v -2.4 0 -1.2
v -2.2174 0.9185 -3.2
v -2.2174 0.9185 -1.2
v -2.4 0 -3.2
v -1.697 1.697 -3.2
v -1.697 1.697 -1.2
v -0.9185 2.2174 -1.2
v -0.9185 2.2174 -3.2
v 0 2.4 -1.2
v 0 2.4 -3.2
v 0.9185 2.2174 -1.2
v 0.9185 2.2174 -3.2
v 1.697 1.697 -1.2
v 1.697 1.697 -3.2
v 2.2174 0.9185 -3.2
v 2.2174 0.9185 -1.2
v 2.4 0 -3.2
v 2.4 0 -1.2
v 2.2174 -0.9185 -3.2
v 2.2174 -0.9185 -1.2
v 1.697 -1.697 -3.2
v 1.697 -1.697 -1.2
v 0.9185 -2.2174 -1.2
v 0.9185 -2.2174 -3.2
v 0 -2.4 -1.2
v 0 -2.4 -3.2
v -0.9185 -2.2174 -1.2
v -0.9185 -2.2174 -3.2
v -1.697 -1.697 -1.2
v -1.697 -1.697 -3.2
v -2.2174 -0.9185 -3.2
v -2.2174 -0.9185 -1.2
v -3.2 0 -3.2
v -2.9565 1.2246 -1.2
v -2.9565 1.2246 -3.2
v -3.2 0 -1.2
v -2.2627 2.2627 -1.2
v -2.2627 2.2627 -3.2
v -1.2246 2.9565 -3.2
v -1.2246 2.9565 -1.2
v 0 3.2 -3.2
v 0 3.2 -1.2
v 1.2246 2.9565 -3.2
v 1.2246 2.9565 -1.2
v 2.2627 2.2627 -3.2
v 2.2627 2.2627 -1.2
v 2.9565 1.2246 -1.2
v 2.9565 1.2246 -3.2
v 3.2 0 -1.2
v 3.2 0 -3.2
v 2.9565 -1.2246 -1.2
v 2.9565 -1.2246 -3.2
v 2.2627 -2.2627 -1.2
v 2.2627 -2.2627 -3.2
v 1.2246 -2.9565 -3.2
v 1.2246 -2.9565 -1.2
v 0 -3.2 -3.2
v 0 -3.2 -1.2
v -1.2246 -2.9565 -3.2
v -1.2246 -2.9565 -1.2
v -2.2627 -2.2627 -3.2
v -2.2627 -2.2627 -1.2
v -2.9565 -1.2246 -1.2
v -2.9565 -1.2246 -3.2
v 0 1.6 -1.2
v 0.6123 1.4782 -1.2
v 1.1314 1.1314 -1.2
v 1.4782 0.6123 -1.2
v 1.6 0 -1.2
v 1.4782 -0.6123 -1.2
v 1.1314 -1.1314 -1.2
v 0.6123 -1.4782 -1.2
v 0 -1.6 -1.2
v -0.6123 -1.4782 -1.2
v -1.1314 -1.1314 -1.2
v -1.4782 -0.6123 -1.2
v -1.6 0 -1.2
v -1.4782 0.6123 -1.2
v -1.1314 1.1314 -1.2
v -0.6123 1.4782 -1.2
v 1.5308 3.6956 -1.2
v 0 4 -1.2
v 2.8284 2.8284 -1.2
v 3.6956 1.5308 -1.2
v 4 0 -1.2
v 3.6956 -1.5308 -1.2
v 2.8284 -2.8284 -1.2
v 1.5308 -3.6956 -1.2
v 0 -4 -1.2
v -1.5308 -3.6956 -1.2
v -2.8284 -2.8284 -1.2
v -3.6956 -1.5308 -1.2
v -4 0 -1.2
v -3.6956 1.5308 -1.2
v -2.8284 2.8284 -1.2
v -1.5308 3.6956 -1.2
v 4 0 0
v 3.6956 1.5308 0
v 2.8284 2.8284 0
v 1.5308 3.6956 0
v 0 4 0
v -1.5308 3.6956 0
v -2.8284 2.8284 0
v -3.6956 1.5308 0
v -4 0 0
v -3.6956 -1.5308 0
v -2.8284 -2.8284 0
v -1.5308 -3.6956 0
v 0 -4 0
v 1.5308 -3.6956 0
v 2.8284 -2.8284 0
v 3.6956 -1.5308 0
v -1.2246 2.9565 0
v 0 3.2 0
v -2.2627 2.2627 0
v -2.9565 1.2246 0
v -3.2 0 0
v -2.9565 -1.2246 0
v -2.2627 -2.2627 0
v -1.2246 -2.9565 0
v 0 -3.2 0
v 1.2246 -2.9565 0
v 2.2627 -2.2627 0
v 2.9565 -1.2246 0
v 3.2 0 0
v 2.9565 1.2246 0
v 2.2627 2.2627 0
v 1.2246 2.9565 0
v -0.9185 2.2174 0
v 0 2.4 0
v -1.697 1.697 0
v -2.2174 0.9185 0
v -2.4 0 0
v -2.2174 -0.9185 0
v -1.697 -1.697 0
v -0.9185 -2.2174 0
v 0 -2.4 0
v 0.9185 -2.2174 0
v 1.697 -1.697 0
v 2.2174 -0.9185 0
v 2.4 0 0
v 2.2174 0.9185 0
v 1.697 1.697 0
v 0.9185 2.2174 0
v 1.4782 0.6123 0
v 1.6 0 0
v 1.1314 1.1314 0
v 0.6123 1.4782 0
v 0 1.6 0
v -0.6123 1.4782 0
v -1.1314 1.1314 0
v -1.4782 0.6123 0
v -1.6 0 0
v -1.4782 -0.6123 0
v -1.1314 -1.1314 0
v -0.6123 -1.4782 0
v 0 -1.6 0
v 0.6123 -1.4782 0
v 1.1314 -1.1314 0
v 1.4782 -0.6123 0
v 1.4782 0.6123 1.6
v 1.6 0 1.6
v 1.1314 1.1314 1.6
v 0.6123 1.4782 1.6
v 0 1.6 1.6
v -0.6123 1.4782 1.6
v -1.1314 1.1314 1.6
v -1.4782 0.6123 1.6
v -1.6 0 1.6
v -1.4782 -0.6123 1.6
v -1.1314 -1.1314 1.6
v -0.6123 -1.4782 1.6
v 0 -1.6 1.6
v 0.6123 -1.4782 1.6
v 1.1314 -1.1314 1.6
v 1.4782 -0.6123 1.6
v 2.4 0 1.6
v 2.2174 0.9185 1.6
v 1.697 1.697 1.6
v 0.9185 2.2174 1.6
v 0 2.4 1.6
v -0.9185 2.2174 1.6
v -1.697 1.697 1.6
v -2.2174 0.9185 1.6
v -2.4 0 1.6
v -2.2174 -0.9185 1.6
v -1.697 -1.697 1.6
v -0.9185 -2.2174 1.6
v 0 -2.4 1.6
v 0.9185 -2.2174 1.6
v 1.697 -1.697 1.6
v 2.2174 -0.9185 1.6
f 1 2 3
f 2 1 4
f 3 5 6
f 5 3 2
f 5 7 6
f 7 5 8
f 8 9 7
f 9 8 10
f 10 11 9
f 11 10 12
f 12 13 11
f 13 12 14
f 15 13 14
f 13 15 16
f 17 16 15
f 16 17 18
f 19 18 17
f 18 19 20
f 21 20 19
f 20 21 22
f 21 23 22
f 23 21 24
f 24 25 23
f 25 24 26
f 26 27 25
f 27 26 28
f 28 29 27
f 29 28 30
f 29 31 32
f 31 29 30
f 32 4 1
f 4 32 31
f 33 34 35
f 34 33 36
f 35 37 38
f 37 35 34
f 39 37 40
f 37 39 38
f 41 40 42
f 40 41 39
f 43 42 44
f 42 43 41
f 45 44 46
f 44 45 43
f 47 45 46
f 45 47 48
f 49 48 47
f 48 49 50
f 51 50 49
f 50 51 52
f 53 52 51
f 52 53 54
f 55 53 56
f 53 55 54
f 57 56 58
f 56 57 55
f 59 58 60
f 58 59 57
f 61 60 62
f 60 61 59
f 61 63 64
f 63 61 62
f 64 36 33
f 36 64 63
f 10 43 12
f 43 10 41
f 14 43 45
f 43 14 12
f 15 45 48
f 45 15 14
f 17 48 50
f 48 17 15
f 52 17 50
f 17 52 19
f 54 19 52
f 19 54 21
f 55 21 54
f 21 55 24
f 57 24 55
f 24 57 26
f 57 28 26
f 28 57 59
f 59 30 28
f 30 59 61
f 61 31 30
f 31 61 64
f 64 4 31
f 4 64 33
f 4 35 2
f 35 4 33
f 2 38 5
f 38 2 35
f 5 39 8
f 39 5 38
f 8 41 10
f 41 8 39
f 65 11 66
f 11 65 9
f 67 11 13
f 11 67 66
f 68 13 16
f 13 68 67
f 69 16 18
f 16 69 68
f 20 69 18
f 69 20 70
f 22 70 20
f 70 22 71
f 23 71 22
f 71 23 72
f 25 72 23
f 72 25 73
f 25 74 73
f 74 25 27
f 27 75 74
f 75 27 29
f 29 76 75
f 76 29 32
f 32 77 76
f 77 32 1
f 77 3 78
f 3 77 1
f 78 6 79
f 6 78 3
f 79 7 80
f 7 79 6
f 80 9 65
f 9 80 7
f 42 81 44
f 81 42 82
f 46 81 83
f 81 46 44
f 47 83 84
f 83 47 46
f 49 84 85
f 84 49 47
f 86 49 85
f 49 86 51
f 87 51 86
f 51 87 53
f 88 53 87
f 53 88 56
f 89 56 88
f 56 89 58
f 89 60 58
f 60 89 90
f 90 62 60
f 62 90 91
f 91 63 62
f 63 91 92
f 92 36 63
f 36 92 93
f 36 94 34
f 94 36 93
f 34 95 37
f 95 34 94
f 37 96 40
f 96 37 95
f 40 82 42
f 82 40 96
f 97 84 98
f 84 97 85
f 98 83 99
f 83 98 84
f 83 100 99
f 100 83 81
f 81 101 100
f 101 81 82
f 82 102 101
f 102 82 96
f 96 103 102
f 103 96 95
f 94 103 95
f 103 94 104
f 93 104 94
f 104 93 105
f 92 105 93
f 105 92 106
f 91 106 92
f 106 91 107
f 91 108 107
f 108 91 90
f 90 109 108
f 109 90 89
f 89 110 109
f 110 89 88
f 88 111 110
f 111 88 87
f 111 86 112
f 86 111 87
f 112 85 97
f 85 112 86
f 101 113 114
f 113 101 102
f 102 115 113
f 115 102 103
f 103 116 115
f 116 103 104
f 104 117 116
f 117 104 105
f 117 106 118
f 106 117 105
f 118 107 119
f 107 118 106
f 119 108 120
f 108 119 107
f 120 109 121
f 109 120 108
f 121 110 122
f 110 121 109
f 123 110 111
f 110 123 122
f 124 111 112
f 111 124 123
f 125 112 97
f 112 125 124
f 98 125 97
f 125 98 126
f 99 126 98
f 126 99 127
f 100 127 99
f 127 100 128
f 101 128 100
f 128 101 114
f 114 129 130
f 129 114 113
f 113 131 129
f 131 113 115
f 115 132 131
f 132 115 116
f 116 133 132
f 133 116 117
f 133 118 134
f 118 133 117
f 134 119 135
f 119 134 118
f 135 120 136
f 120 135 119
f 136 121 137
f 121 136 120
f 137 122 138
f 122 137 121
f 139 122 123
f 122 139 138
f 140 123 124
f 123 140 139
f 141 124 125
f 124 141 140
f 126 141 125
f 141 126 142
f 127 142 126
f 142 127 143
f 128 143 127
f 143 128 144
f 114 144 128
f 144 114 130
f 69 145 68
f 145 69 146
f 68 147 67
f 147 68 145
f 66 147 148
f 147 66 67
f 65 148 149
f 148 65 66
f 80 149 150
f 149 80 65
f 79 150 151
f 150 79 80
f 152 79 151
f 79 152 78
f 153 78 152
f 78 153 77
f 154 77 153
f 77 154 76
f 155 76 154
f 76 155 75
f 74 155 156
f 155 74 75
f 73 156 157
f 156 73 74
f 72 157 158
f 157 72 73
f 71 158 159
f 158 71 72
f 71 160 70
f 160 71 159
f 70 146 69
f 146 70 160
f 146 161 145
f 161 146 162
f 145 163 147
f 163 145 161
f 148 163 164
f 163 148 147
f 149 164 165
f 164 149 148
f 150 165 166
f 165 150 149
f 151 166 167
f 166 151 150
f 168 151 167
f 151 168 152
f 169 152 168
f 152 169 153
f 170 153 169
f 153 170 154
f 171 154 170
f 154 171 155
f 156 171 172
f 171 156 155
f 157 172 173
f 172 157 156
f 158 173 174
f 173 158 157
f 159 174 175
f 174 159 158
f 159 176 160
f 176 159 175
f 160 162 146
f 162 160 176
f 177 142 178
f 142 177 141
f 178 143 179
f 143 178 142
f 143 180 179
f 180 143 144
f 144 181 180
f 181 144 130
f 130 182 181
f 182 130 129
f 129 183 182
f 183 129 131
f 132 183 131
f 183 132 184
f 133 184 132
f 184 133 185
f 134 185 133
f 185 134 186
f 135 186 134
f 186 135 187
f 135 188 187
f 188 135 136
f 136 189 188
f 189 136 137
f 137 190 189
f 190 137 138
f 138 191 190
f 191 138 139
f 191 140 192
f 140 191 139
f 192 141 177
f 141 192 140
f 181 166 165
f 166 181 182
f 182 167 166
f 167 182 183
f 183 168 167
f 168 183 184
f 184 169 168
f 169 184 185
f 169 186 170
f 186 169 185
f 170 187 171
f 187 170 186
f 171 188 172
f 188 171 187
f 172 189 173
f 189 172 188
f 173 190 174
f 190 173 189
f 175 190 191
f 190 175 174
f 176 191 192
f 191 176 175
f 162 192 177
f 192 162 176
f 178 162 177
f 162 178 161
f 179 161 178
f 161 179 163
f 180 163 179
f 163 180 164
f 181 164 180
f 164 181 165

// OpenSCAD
// file: ../p/stud4.scad
use <../lib.scad>
use <4-4cyli.scad>
use <4-4edge.scad>
use <4-4ring3.scad>
function ldraw_lib__stud4() = [
// 0 Stud Tube Open
// 0 Name: stud4.dat
// 0 Author: James Jessiman
// 0 !LDRAW_ORG Primitive UPDATE 2009-02
// 0 !LICENSE Licensed under CC BY 2.0 and CC BY 4.0 : see CAreadme.txt
// 
// 0 BFC CERTIFY CCW
  [0,"BFC","CERTIFY"],
  [0,"BFC","CCW"],
// 
// 0 !HISTORY 1999-07-05 [PTadmin] Official Update 1999-05
// 0 !HISTORY 2002-04-04 [sbliss] Modified for BFC compliance
// 0 !HISTORY 2002-04-25 [PTadmin] Official Update 2002-02
// 0 !HISTORY 2007-06-24 [PTadmin] Header formatted for Contributor Agreement
// 0 !HISTORY 2008-07-01 [PTadmin] Official Update 2008-01
// 0 !HISTORY 2009-06-21 [cwdee] Update ring references to 4-4ring
// 0 !HISTORY 2009-09-03 [PTadmin] Official Update 2009-02
// 
// 
// 1 16 0 -4 0 6 0 0 0 1 0 0 0 6 4-4edge.dat
  [1,16,0,-4,0,6,0,0,0,1,0,0,0,6, ldraw_lib__4_4edge()],
// 1 16 0 -4 0 8 0 0 0 1 0 0 0 8 4-4edge.dat
  [1,16,0,-4,0,8,0,0,0,1,0,0,0,8, ldraw_lib__4_4edge()],
// 1 16 0 0 0 6 0 0 0 1 0 0 0 6 4-4edge.dat
  [1,16,0,0,0,6,0,0,0,1,0,0,0,6, ldraw_lib__4_4edge()],
// 1 16 0 0 0 8 0 0 0 1 0 0 0 8 4-4edge.dat
  [1,16,0,0,0,8,0,0,0,1,0,0,0,8, ldraw_lib__4_4edge()],
// 0 BFC INVERTNEXT
  [0,"BFC","INVERTNEXT"],
// 1 16 0 -4 0 6 0 0 0 4 0 0 0 6 4-4cyli.dat
  [1,16,0,-4,0,6,0,0,0,4,0,0,0,6, ldraw_lib__4_4cyli()],
// 1 16 0 -4 0 8 0 0 0 4 0 0 0 8 4-4cyli.dat
  [1,16,0,-4,0,8,0,0,0,4,0,0,0,8, ldraw_lib__4_4cyli()],
// 1 16 0 -4 0 2 0 0 0 1 0 0 0 2 4-4ring3.dat
  [1,16,0,-4,0,2,0,0,0,1,0,0,0,2, ldraw_lib__4_4ring3()],
// 0
];
makepoly(ldraw_lib__stud4(), line=0.2);
// file: ../p/stud2a.scad
use <../lib.scad>
use <4-4cyli.scad>
use <4-4edge.scad>
use <4-4ring2.scad>
function ldraw_lib__stud2a() = [
// 0 Stud Open without Base Edges
// 0 Name: stud2a.dat
// 0 Author: James Jessiman
// 0 !LDRAW_ORG Primitive UPDATE 2009-02
// 0 !LICENSE Licensed under CC BY 2.0 and CC BY 4.0 : see CAreadme.txt
// 
// 0 BFC CERTIFY CCW
  [0,"BFC","CERTIFY"],
  [0,"BFC","CCW"],
// 
// 0 !HISTORY 1999-07-05 [PTadmin] Official Update 1999-05
// 0 !HISTORY 2002-04-04 [sbliss] Modified for BFC compliance
// 0 !HISTORY 2002-04-25 [PTadmin] Official Update 2002-02
// 0 !HISTORY 2007-06-24 [PTadmin] Header formatted for Contributor Agreement
// 0 !HISTORY 2008-07-01 [PTadmin] Official Update 2008-01
// 0 !HISTORY 2009-06-21 [cwdee] Update ring references to 4-4ring
// 0 !HISTORY 2009-09-03 [PTadmin] Official Update 2009-02
// 
// 
// 1 16 0 -4 0 4 0 0 0 1 0 0 0 4 4-4edge.dat
  [1,16,0,-4,0,4,0,0,0,1,0,0,0,4, ldraw_lib__4_4edge()],
// 1 16 0 -4 0 6 0 0 0 1 0 0 0 6 4-4edge.dat
  [1,16,0,-4,0,6,0,0,0,1,0,0,0,6, ldraw_lib__4_4edge()],
// 0 BFC INVERTNEXT
  [0,"BFC","INVERTNEXT"],
// 1 16 0 -4 0 4 0 0 0 4 0 0 0 4 4-4cyli.dat
  [1,16,0,-4,0,4,0,0,0,4,0,0,0,4, ldraw_lib__4_4cyli()],
// 1 16 0 -4 0 6 0 0 0 4 0 0 0 6 4-4cyli.dat
  [1,16,0,-4,0,6,0,0,0,4,0,0,0,6, ldraw_lib__4_4cyli()],
// 1 16 0 -4 0 2 0 0 0 1 0 0 0 2 4-4ring2.dat
  [1,16,0,-4,0,2,0,0,0,1,0,0,0,2, ldraw_lib__4_4ring2()],
// 0
];
makepoly(ldraw_lib__stud2a(), line=0.2);
// file: ../p/4-4ring4.scad
use <../lib.scad>
function ldraw_lib__4_4ring4() = [
// 0 Ring  4 x 1.0
// 0 Name: 4-4ring4.dat
// 0 Author: James Jessiman
// 0 !LDRAW_ORG Primitive UPDATE 2009-01
// 0 !LICENSE Licensed under CC BY 2.0 and CC BY 4.0 : see CAreadme.txt
// 
// 0 BFC CERTIFY CCW
  [0,"BFC","CERTIFY"],
  [0,"BFC","CCW"],
// 
// 0 !HISTORY 1998-12-15 [PTadmin] Official Update 1998-10
// 0 !HISTORY 2002-04-08 [BrickCaster] Modified for BFC compliance
// 0 !HISTORY 2002-04-25 [PTadmin] Official Update 2002-02
// 0 !HISTORY 2007-06-24 [PTadmin] Header formatted for Contributor Agreement
// 0 !HISTORY 2008-07-01 [PTadmin] Official Update 2008-01
// 0 !HISTORY 2008-08-26 [cwdee] Switch polygon winding and rename
// 0 !HISTORY 2009-05-02 [PTadmin] Official Update 2009-01
// 
// 
// 4 16 -1.9135 0 4.6195 -1.5308 0 3.6956 0 0 4 0 0 5
  [4,16,-1.9135,0,4.6195,-1.5308,0,3.6956,0,0,4,0,0,5],
// 4 16 -3.5355 0 3.5355 -2.8284 0 2.8284 -1.5308 0 3.6956 -1.9135 0 4.6195
  [4,16,-3.5355,0,3.5355,-2.8284,0,2.8284,-1.5308,0,3.6956,-1.9135,0,4.6195],
// 4 16 -4.6195 0 1.9135 -3.6956 0 1.5308 -2.8284 0 2.8284 -3.5355 0 3.5355
  [4,16,-4.6195,0,1.9135,-3.6956,0,1.5308,-2.8284,0,2.8284,-3.5355,0,3.5355],
// 4 16 -5 0 0 -4 0 0 -3.6956 0 1.5308 -4.6195 0 1.9135
  [4,16,-5,0,0,-4,0,0,-3.6956,0,1.5308,-4.6195,0,1.9135],
// 4 16 -4.6195 0 -1.9135 -3.6956 0 -1.5308 -4 0 0 -5 0 0
  [4,16,-4.6195,0,-1.9135,-3.6956,0,-1.5308,-4,0,0,-5,0,0],
// 4 16 -3.5355 0 -3.5355 -2.8284 0 -2.8284 -3.6956 0 -1.5308 -4.6195 0 -1.9135
  [4,16,-3.5355,0,-3.5355,-2.8284,0,-2.8284,-3.6956,0,-1.5308,-4.6195,0,-1.9135],
// 4 16 -1.9135 0 -4.6195 -1.5308 0 -3.6956 -2.8284 0 -2.8284 -3.5355 0 -3.5355
  [4,16,-1.9135,0,-4.6195,-1.5308,0,-3.6956,-2.8284,0,-2.8284,-3.5355,0,-3.5355],
// 4 16 0 0 -5 0 0 -4 -1.5308 0 -3.6956 -1.9135 0 -4.6195
  [4,16,0,0,-5,0,0,-4,-1.5308,0,-3.6956,-1.9135,0,-4.6195],
// 4 16 1.9135 0 -4.6195 1.5308 0 -3.6956 0 0 -4 0 0 -5
  [4,16,1.9135,0,-4.6195,1.5308,0,-3.6956,0,0,-4,0,0,-5],
// 4 16 3.5355 0 -3.5355 2.8284 0 -2.8284 1.5308 0 -3.6956 1.9135 0 -4.6195
  [4,16,3.5355,0,-3.5355,2.8284,0,-2.8284,1.5308,0,-3.6956,1.9135,0,-4.6195],
// 4 16 4.6195 0 -1.9135 3.6956 0 -1.5308 2.8284 0 -2.8284 3.5355 0 -3.5355
  [4,16,4.6195,0,-1.9135,3.6956,0,-1.5308,2.8284,0,-2.8284,3.5355,0,-3.5355],
// 4 16 5 0 0 4 0 0 3.6956 0 -1.5308 4.6195 0 -1.9135
  [4,16,5,0,0,4,0,0,3.6956,0,-1.5308,4.6195,0,-1.9135],
// 4 16 4.6195 0 1.9135 3.6956 0 1.5308 4 0 0 5 0 0
  [4,16,4.6195,0,1.9135,3.6956,0,1.5308,4,0,0,5,0,0],
// 4 16 3.5355 0 3.5355 2.8284 0 2.8284 3.6956 0 1.5308 4.6195 0 1.9135
  [4,16,3.5355,0,3.5355,2.8284,0,2.8284,3.6956,0,1.5308,4.6195,0,1.9135],
// 4 16 1.9135 0 4.6195 1.5308 0 3.6956 2.8284 0 2.8284 3.5355 0 3.5355
  [4,16,1.9135,0,4.6195,1.5308,0,3.6956,2.8284,0,2.8284,3.5355,0,3.5355],
// 4 16 0 0 5 0 0 4 1.5308 0 3.6956 1.9135 0 4.6195
  [4,16,0,0,5,0,0,4,1.5308,0,3.6956,1.9135,0,4.6195],
// 0
];
makepoly(ldraw_lib__4_4ring4(), line=0.2);
// file: ../p/4-4ring3.scad
use <../lib.scad>
function ldraw_lib__4_4ring3() = [
// 0 Ring  3 x 1.0
// 0 Name: 4-4ring3.dat
// 0 Author: James Jessiman
// 0 !LDRAW_ORG Primitive UPDATE 2009-01
// 0 !LICENSE Licensed under CC BY 2.0 and CC BY 4.0 : see CAreadme.txt
// 
// 0 BFC CERTIFY CCW
  [0,"BFC","CERTIFY"],
  [0,"BFC","CCW"],
// 
// 0 !HISTORY 1998-12-15 [PTadmin] Official Update 1998-10
// 0 !HISTORY 2002-04-05 [hafhead] Added BFC statement
// 0 !HISTORY 2002-04-25 [PTadmin] Official Update 2002-02
// 0 !HISTORY 2007-06-24 [PTadmin] Header formatted for Contributor Agreement
// 0 !HISTORY 2008-07-01 [PTadmin] Official Update 2008-01
// 0 !HISTORY 2008-08-26 [cwdee] Switch polygon winding and rename
// 0 !HISTORY 2009-05-02 [PTadmin] Official Update 2009-01
// 
// 
// 4 16 -1.5308 0 3.6956 -1.1481 0 2.7717 0 0 3 0 0 4
  [4,16,-1.5308,0,3.6956,-1.1481,0,2.7717,0,0,3,0,0,4],
// 4 16 -2.8284 0 2.8284 -2.1213 0 2.1213 -1.1481 0 2.7717 -1.5308 0 3.6956
  [4,16,-2.8284,0,2.8284,-2.1213,0,2.1213,-1.1481,0,2.7717,-1.5308,0,3.6956],
// 4 16 -3.6956 0 1.5308 -2.7717 0 1.1481 -2.1213 0 2.1213 -2.8284 0 2.8284
  [4,16,-3.6956,0,1.5308,-2.7717,0,1.1481,-2.1213,0,2.1213,-2.8284,0,2.8284],
// 4 16 -4 0 0 -3 0 0 -2.7717 0 1.1481 -3.6956 0 1.5308
  [4,16,-4,0,0,-3,0,0,-2.7717,0,1.1481,-3.6956,0,1.5308],
// 4 16 -3.6956 0 -1.5308 -2.7717 0 -1.1481 -3 0 0 -4 0 0
  [4,16,-3.6956,0,-1.5308,-2.7717,0,-1.1481,-3,0,0,-4,0,0],
// 4 16 -2.8284 0 -2.8284 -2.1213 0 -2.1213 -2.7717 0 -1.1481 -3.6956 0 -1.5308
  [4,16,-2.8284,0,-2.8284,-2.1213,0,-2.1213,-2.7717,0,-1.1481,-3.6956,0,-1.5308],
// 4 16 -1.5308 0 -3.6956 -1.1481 0 -2.7717 -2.1213 0 -2.1213 -2.8284 0 -2.8284
  [4,16,-1.5308,0,-3.6956,-1.1481,0,-2.7717,-2.1213,0,-2.1213,-2.8284,0,-2.8284],
// 4 16 0 0 -4 0 0 -3 -1.1481 0 -2.7717 -1.5308 0 -3.6956
  [4,16,0,0,-4,0,0,-3,-1.1481,0,-2.7717,-1.5308,0,-3.6956],
// 4 16 1.5308 0 -3.6956 1.1481 0 -2.7717 0 0 -3 0 0 -4
  [4,16,1.5308,0,-3.6956,1.1481,0,-2.7717,0,0,-3,0,0,-4],
// 4 16 2.8284 0 -2.8284 2.1213 0 -2.1213 1.1481 0 -2.7717 1.5308 0 -3.6956
  [4,16,2.8284,0,-2.8284,2.1213,0,-2.1213,1.1481,0,-2.7717,1.5308,0,-3.6956],
// 4 16 3.6956 0 -1.5308 2.7717 0 -1.1481 2.1213 0 -2.1213 2.8284 0 -2.8284
  [4,16,3.6956,0,-1.5308,2.7717,0,-1.1481,2.1213,0,-2.1213,2.8284,0,-2.8284],
// 4 16 4 0 0 3 0 0 2.7717 0 -1.1481 3.6956 0 -1.5308
  [4,16,4,0,0,3,0,0,2.7717,0,-1.1481,3.6956,0,-1.5308],
// 4 16 3.6956 0 1.5308 2.7717 0 1.1481 3 0 0 4 0 0
  [4,16,3.6956,0,1.5308,2.7717,0,1.1481,3,0,0,4,0,0],
// 4 16 2.8284 0 2.8284 2.1213 0 2.1213 2.7717 0 1.1481 3.6956 0 1.5308
  [4,16,2.8284,0,2.8284,2.1213,0,2.1213,2.7717,0,1.1481,3.6956,0,1.5308],
// 4 16 1.5308 0 3.6956 1.1481 0 2.7717 2.1213 0 2.1213 2.8284 0 2.8284
  [4,16,1.5308,0,3.6956,1.1481,0,2.7717,2.1213,0,2.1213,2.8284,0,2.8284],
// 4 16 0 0 4 0 0 3 1.1481 0 2.7717 1.5308 0 3.6956
  [4,16,0,0,4,0,0,3,1.1481,0,2.7717,1.5308,0,3.6956],
// 0
];
makepoly(ldraw_lib__4_4ring3(), line=0.2);
// file: ../p/4-4ring2.scad
use <../lib.scad>
function ldraw_lib__4_4ring2() = [
// 0 Ring  2 x 1.0
// 0 Name: 4-4ring2.dat
// 0 Author: James Jessiman
// 0 !LDRAW_ORG Primitive UPDATE 2009-01
// 0 !LICENSE Licensed under CC BY 2.0 and CC BY 4.0 : see CAreadme.txt
// 
// 0 BFC CERTIFY CCW
  [0,"BFC","CERTIFY"],
  [0,"BFC","CCW"],
// 
// 0 !HISTORY 1998-12-15 [PTadmin] Official Update 1998-10
// 0 !HISTORY 2002-04-05 [hafhead] Added BFC statement
// 0 !HISTORY 2002-04-25 [PTadmin] Official Update 2002-02
// 0 !HISTORY 2007-06-24 [PTadmin] Header formatted for Contributor Agreement
// 0 !HISTORY 2008-07-01 [PTadmin] Official Update 2008-01
// 0 !HISTORY 2008-08-26 [cwdee] Switch polygon winding and rename
// 0 !HISTORY 2009-05-02 [PTadmin] Official Update 2009-01
// 
// 
// 4 16 -1.1481 0 2.7717 -0.7654 0 1.8478 0 0 2 0 0 3
  [4,16,-1.1481,0,2.7717,-0.7654,0,1.8478,0,0,2,0,0,3],
// 4 16 -2.1213 0 2.1213 -1.4142 0 1.4142 -0.7654 0 1.8478 -1.1481 0 2.7717
  [4,16,-2.1213,0,2.1213,-1.4142,0,1.4142,-0.7654,0,1.8478,-1.1481,0,2.7717],
// 4 16 -2.7717 0 1.1481 -1.8478 0 0.7654 -1.4142 0 1.4142 -2.1213 0 2.1213
  [4,16,-2.7717,0,1.1481,-1.8478,0,0.7654,-1.4142,0,1.4142,-2.1213,0,2.1213],
// 4 16 -3 0 0 -2 0 0 -1.8478 0 0.7654 -2.7717 0 1.1481
  [4,16,-3,0,0,-2,0,0,-1.8478,0,0.7654,-2.7717,0,1.1481],
// 4 16 -2.7717 0 -1.1481 -1.8478 0 -0.7654 -2 0 0 -3 0 0
  [4,16,-2.7717,0,-1.1481,-1.8478,0,-0.7654,-2,0,0,-3,0,0],
// 4 16 -2.1213 0 -2.1213 -1.4142 0 -1.4142 -1.8478 0 -0.7654 -2.7717 0 -1.1481
  [4,16,-2.1213,0,-2.1213,-1.4142,0,-1.4142,-1.8478,0,-0.7654,-2.7717,0,-1.1481],
// 4 16 -1.1481 0 -2.7717 -0.7654 0 -1.8478 -1.4142 0 -1.4142 -2.1213 0 -2.1213
  [4,16,-1.1481,0,-2.7717,-0.7654,0,-1.8478,-1.4142,0,-1.4142,-2.1213,0,-2.1213],
// 4 16 0 0 -3 0 0 -2 -0.7654 0 -1.8478 -1.1481 0 -2.7717
  [4,16,0,0,-3,0,0,-2,-0.7654,0,-1.8478,-1.1481,0,-2.7717],
// 4 16 1.1481 0 -2.7717 0.7654 0 -1.8478 0 0 -2 0 0 -3
  [4,16,1.1481,0,-2.7717,0.7654,0,-1.8478,0,0,-2,0,0,-3],
// 4 16 2.1213 0 -2.1213 1.4142 0 -1.4142 0.7654 0 -1.8478 1.1481 0 -2.7717
  [4,16,2.1213,0,-2.1213,1.4142,0,-1.4142,0.7654,0,-1.8478,1.1481,0,-2.7717],
// 4 16 2.7717 0 -1.1481 1.8478 0 -0.7654 1.4142 0 -1.4142 2.1213 0 -2.1213
  [4,16,2.7717,0,-1.1481,1.8478,0,-0.7654,1.4142,0,-1.4142,2.1213,0,-2.1213],
// 4 16 3 0 0 2 0 0 1.8478 0 -0.7654 2.7717 0 -1.1481
  [4,16,3,0,0,2,0,0,1.8478,0,-0.7654,2.7717,0,-1.1481],
// 4 16 2.7717 0 1.1481 1.8478 0 0.7654 2 0 0 3 0 0
  [4,16,2.7717,0,1.1481,1.8478,0,0.7654,2,0,0,3,0,0],
// 4 16 2.1213 0 2.1213 1.4142 0 1.4142 1.8478 0 0.7654 2.7717 0 1.1481
  [4,16,2.1213,0,2.1213,1.4142,0,1.4142,1.8478,0,0.7654,2.7717,0,1.1481],
// 4 16 1.1481 0 2.7717 0.7654 0 1.8478 1.4142 0 1.4142 2.1213 0 2.1213
  [4,16,1.1481,0,2.7717,0.7654,0,1.8478,1.4142,0,1.4142,2.1213,0,2.1213],
// 4 16 0 0 3 0 0 2 0.7654 0 1.8478 1.1481 0 2.7717
  [4,16,0,0,3,0,0,2,0.7654,0,1.8478,1.1481,0,2.7717],
// 0
];
makepoly(ldraw_lib__4_4ring2(), line=0.2);
// file: ../p/4-4edge.scad
use <../lib.scad>
function ldraw_lib__4_4edge() = [
// 0 Circle 1.0
// 0 Name: 4-4edge.dat
// 0 Author: James Jessiman
// 0 !LDRAW_ORG Primitive UPDATE 2017-01
// 0 !LICENSE Licensed under CC BY 2.0 and CC BY 4.0 : see CAreadme.txt
// 
// 0 BFC CERTIFY CCW
  [0,"BFC","CERTIFY"],
  [0,"BFC","CCW"],
// 
// 0 !HISTORY 1998-12-15 [PTadmin] Official Update 1998-10
// 0 !HISTORY 2005-12-28 [PTadmin] Official Update 2005-01
// 0 !HISTORY 2007-06-24 [PTadmin] Header formatted for Contributor Agreement
// 0 !HISTORY 2008-07-01 [PTadmin] Official Update 2008-01
// 0 !HISTORY 2017-01-15 [Steffen] BFCed
// 0 !HISTORY 2017-12-30 [PTadmin] Official Update 2017-01
// 
// 
// 2 24 1 0 0 0.9239 0 0.3827
  [2,24,1,0,0,0.9239,0,0.3827],
// 2 24 0.9239 0 0.3827 0.7071 0 0.7071
  [2,24,0.9239,0,0.3827,0.7071,0,0.7071],
// 2 24 0.7071 0 0.7071 0.3827 0 0.9239
  [2,24,0.7071,0,0.7071,0.3827,0,0.9239],
// 2 24 0.3827 0 0.9239 0 0 1
  [2,24,0.3827,0,0.9239,0,0,1],
// 2 24 0 0 1 -0.3827 0 0.9239
  [2,24,0,0,1,-0.3827,0,0.9239],
// 2 24 -0.3827 0 0.9239 -0.7071 0 0.7071
  [2,24,-0.3827,0,0.9239,-0.7071,0,0.7071],
// 2 24 -0.7071 0 0.7071 -0.9239 0 0.3827
  [2,24,-0.7071,0,0.7071,-0.9239,0,0.3827],
// 2 24 -0.9239 0 0.3827 -1 0 -0
  [2,24,-0.9239,0,0.3827,-1,0,-0],
// 2 24 -1 0 -0 -0.9239 0 -0.3827
  [2,24,-1,0,-0,-0.9239,0,-0.3827],
// 2 24 -0.9239 0 -0.3827 -0.7071 0 -0.7071
  [2,24,-0.9239,0,-0.3827,-0.7071,0,-0.7071],
// 2 24 -0.7071 0 -0.7071 -0.3827 0 -0.9239
  [2,24,-0.7071,0,-0.7071,-0.3827,0,-0.9239],
// 2 24 -0.3827 0 -0.9239 0 0 -1
  [2,24,-0.3827,0,-0.9239,0,0,-1],
// 2 24 0 0 -1 0.3827 0 -0.9239
  [2,24,0,0,-1,0.3827,0,-0.9239],
// 2 24 0.3827 0 -0.9239 0.7071 0 -0.7071
  [2,24,0.3827,0,-0.9239,0.7071,0,-0.7071],
// 2 24 0.7071 0 -0.7071 0.9239 0 -0.3827
  [2,24,0.7071,0,-0.7071,0.9239,0,-0.3827],
// 2 24 0.9239 0 -0.3827 1 0 0
  [2,24,0.9239,0,-0.3827,1,0,0],
];
makepoly(ldraw_lib__4_4edge(), line=0.2);
// file: ../p/4-4cyli.scad
use <../lib.scad>
function ldraw_lib__4_4cyli() = [
// 0 Cylinder 1.0
// 0 Name: 4-4cyli.dat
// 0 Author: James Jessiman
// 0 !LDRAW_ORG Primitive UPDATE 2005-01
// 0 !LICENSE Licensed under CC BY 2.0 and CC BY 4.0 : see CAreadme.txt
// 
// 0 BFC CERTIFY CCW
  [0,"BFC","CERTIFY"],
  [0,"BFC","CCW"],
// 
// 0 !HISTORY 1998-12-15 [PTadmin] Official Update 1998-10
// 0 !HISTORY 2002-03-23 [sbliss] Added BFC statement; merged headers from files in distributions LDraw 0.27 and Complete.
// 0 !HISTORY 2002-04-25 [PTadmin] Official Update 2002-02
// 0 !HISTORY 2004-12-14 [guyvivan] BFC CCW
// 0 !HISTORY 2005-12-28 [PTadmin] Official Update 2005-01
// 0 !HISTORY 2007-06-24 [PTadmin] Header formatted for Contributor Agreement
// 0 !HISTORY 2008-07-01 [PTadmin] Official Update 2008-01
// 
// 
// 4 16 1 1 0 0.9239 1 0.3827 0.9239 0 0.3827 1 0 0
  [4,16,1,1,0,0.9239,1,0.3827,0.9239,0,0.3827,1,0,0],
// 5 24 1 0 0 1 1 0 0.9239 0 0.3827 0.9239 0 -0.3827
  [5,24,1,0,0,1,1,0,0.9239,0,0.3827,0.9239,0,-0.3827],
// 4 16 0.9239 1 0.3827 0.7071 1 0.7071 0.7071 0 0.7071 0.9239 0 0.3827
  [4,16,0.9239,1,0.3827,0.7071,1,0.7071,0.7071,0,0.7071,0.9239,0,0.3827],
// 5 24 0.9239 0 0.3827 0.9239 1 0.3827 0.7071 0 0.7071 1 0 0
  [5,24,0.9239,0,0.3827,0.9239,1,0.3827,0.7071,0,0.7071,1,0,0],
// 4 16 0.7071 1 0.7071 0.3827 1 0.9239 0.3827 0 0.9239 0.7071 0 0.7071
  [4,16,0.7071,1,0.7071,0.3827,1,0.9239,0.3827,0,0.9239,0.7071,0,0.7071],
// 5 24 0.7071 0 0.7071 0.7071 1 0.7071 0.3827 0 0.9239 0.9239 0 0.3827
  [5,24,0.7071,0,0.7071,0.7071,1,0.7071,0.3827,0,0.9239,0.9239,0,0.3827],
// 4 16 0.3827 1 0.9239 0 1 1 0 0 1 0.3827 0 0.9239
  [4,16,0.3827,1,0.9239,0,1,1,0,0,1,0.3827,0,0.9239],
// 5 24 0.3827 0 0.9239 0.3827 1 0.9239 0 0 1 0.7071 0 0.7071
  [5,24,0.3827,0,0.9239,0.3827,1,0.9239,0,0,1,0.7071,0,0.7071],
// 4 16 0 1 1 -0.3827 1 0.9239 -0.3827 0 0.9239 0 0 1
  [4,16,0,1,1,-0.3827,1,0.9239,-0.3827,0,0.9239,0,0,1],
// 5 24 0 0 1 0 1 1 -0.3827 0 0.9239 0.3827 0 0.9239
  [5,24,0,0,1,0,1,1,-0.3827,0,0.9239,0.3827,0,0.9239],
// 4 16 -0.3827 1 0.9239 -0.7071 1 0.7071 -0.7071 0 0.7071 -0.3827 0 0.9239
  [4,16,-0.3827,1,0.9239,-0.7071,1,0.7071,-0.7071,0,0.7071,-0.3827,0,0.9239],
// 5 24 -0.3827 0 0.9239 -0.3827 1 0.9239 -0.7071 0 0.7071 0 0 1
  [5,24,-0.3827,0,0.9239,-0.3827,1,0.9239,-0.7071,0,0.7071,0,0,1],
// 4 16 -0.7071 1 0.7071 -0.9239 1 0.3827 -0.9239 0 0.3827 -0.7071 0 0.7071
  [4,16,-0.7071,1,0.7071,-0.9239,1,0.3827,-0.9239,0,0.3827,-0.7071,0,0.7071],
// 5 24 -0.7071 0 0.7071 -0.7071 1 0.7071 -0.9239 0 0.3827 -0.3827 0 0.9239
  [5,24,-0.7071,0,0.7071,-0.7071,1,0.7071,-0.9239,0,0.3827,-0.3827,0,0.9239],
// 4 16 -0.9239 1 0.3827 -1 1 0 -1 0 0 -0.9239 0 0.3827
  [4,16,-0.9239,1,0.3827,-1,1,0,-1,0,0,-0.9239,0,0.3827],
// 5 24 -0.9239 0 0.3827 -0.9239 1 0.3827 -1 0 0 -0.7071 0 0.7071
  [5,24,-0.9239,0,0.3827,-0.9239,1,0.3827,-1,0,0,-0.7071,0,0.7071],
// 4 16 -1 1 0 -0.9239 1 -0.3827 -0.9239 0 -0.3827 -1 0 0
  [4,16,-1,1,0,-0.9239,1,-0.3827,-0.9239,0,-0.3827,-1,0,0],
// 5 24 -1 0 0 -1 1 0 -0.9239 0 -0.3827 -0.9239 0 0.3827
  [5,24,-1,0,0,-1,1,0,-0.9239,0,-0.3827,-0.9239,0,0.3827],
// 4 16 -0.9239 1 -0.3827 -0.7071 1 -0.7071 -0.7071 0 -0.7071 -0.9239 0 -0.3827
  [4,16,-0.9239,1,-0.3827,-0.7071,1,-0.7071,-0.7071,0,-0.7071,-0.9239,0,-0.3827],
// 5 24 -0.9239 0 -0.3827 -0.9239 1 -0.3827 -0.7071 0 -0.7071 -1 0 0
  [5,24,-0.9239,0,-0.3827,-0.9239,1,-0.3827,-0.7071,0,-0.7071,-1,0,0],
// 4 16 -0.7071 1 -0.7071 -0.3827 1 -0.9239 -0.3827 0 -0.9239 -0.7071 0 -0.7071
  [4,16,-0.7071,1,-0.7071,-0.3827,1,-0.9239,-0.3827,0,-0.9239,-0.7071,0,-0.7071],
// 5 24 -0.7071 0 -0.7071 -0.7071 1 -0.7071 -0.3827 0 -0.9239 -0.9239 0 -0.3827
  [5,24,-0.7071,0,-0.7071,-0.7071,1,-0.7071,-0.3827,0,-0.9239,-0.9239,0,-0.3827],
// 4 16 -0.3827 1 -0.9239 0 1 -1 0 0 -1 -0.3827 0 -0.9239
  [4,16,-0.3827,1,-0.9239,0,1,-1,0,0,-1,-0.3827,0,-0.9239],
// 5 24 -0.3827 0 -0.9239 -0.3827 1 -0.9239 0 0 -1 -0.7071 0 -0.7071
  [5,24,-0.3827,0,-0.9239,-0.3827,1,-0.9239,0,0,-1,-0.7071,0,-0.7071],
// 4 16 0 1 -1 0.3827 1 -0.9239 0.3827 0 -0.9239 0 0 -1
  [4,16,0,1,-1,0.3827,1,-0.9239,0.3827,0,-0.9239,0,0,-1],
// 5 24 0 0 -1 0 1 -1 0.3827 0 -0.9239 -0.3827 0 -0.9239
  [5,24,0,0,-1,0,1,-1,0.3827,0,-0.9239,-0.3827,0,-0.9239],
// 4 16 0.3827 1 -0.9239 0.7071 1 -0.7071 0.7071 0 -0.7071 0.3827 0 -0.9239
  [4,16,0.3827,1,-0.9239,0.7071,1,-0.7071,0.7071,0,-0.7071,0.3827,0,-0.9239],
// 5 24 0.3827 0 -0.9239 0.3827 1 -0.9239 0.7071 0 -0.7071 0 0 -1
  [5,24,0.3827,0,-0.9239,0.3827,1,-0.9239,0.7071,0,-0.7071,0,0,-1],
// 4 16 0.7071 1 -0.7071 0.9239 1 -0.3827 0.9239 0 -0.3827 0.7071 0 -0.7071
  [4,16,0.7071,1,-0.7071,0.9239,1,-0.3827,0.9239,0,-0.3827,0.7071,0,-0.7071],
// 5 24 0.7071 0 -0.7071 0.7071 1 -0.7071 0.9239 0 -0.3827 0.3827 0 -0.9239
  [5,24,0.7071,0,-0.7071,0.7071,1,-0.7071,0.9239,0,-0.3827,0.3827,0,-0.9239],
// 4 16 0.9239 1 -0.3827 1 1 0 1 0 0 0.9239 0 -0.3827
  [4,16,0.9239,1,-0.3827,1,1,0,1,0,0,0.9239,0,-0.3827],
// 5 24 0.9239 0 -0.3827 0.9239 1 -0.3827 1 0 0 0.7071 0 -0.7071
  [5,24,0.9239,0,-0.3827,0.9239,1,-0.3827,1,0,0,0.7071,0,-0.7071],
// 0
];
makepoly(ldraw_lib__4_4cyli(), line=0.2);
// main file
use <../lib.scad>
use <../p/4-4cyli.scad>
use <../p/4-4edge.scad>
use <../p/4-4ring2.scad>
use <../p/4-4ring3.scad>
use <../p/4-4ring4.scad>
use <../p/stud2a.scad>
use <../p/stud4.scad>
function ldraw_lib__85861() = [
// 0 Plate  1 x  1 Round with Open Stud
// 0 Name: 85861.dat
// 0 Author: Magnus Forsberg [MagFors]
// 0 !LDRAW_ORG Part UPDATE 2010-01
// 0 !LICENSE Licensed under CC BY 2.0 and CC BY 4.0 : see CAreadme.txt
// 
// 0 BFC CERTIFY CW
  [0,"BFC","CERTIFY"],
  [0,"BFC","CW"],
// 
// 0 !HISTORY 2010-04-05 [PTadmin] Official Update 2010-01
// 
// 
// 1 16 0 3 0 -1 0 0 0 -1.25 0 0 0 1 stud4.dat
  [1,16,0,3,0,-1,0,0,0,-1.25,0,0,0,1, ldraw_lib__stud4()],
// 1 16 0 3 0 4 0 0 0 1 0 0 0 4 4-4edge.dat
  [1,16,0,3,0,4,0,0,0,1,0,0,0,4, ldraw_lib__4_4edge()],
// 1 16 0 3 0 -2 0 0 0 -1 0 0 0 2 4-4ring2.dat
  [1,16,0,3,0,-2,0,0,0,-1,0,0,0,2, ldraw_lib__4_4ring2()],
// 1 16 0 3 0 10 0 0 0 1 0 0 0 10 4-4edge.dat
  [1,16,0,3,0,10,0,0,0,1,0,0,0,10, ldraw_lib__4_4edge()],
// 1 16 0 3 0 -2 0 0 0 -1 0 0 0 2 4-4ring4.dat
  [1,16,0,3,0,-2,0,0,0,-1,0,0,0,2, ldraw_lib__4_4ring4()],
// 1 16 0 0 0 10 0 0 0 1 0 0 0 10 4-4edge.dat
  [1,16,0,0,0,10,0,0,0,1,0,0,0,10, ldraw_lib__4_4edge()],
// 1 16 0 0 0 10 0 0 0 3 0 0 0 10 4-4cyli.dat
  [1,16,0,0,0,10,0,0,0,3,0,0,0,10, ldraw_lib__4_4cyli()],
// 1 16 0 0 0 6 0 0 0 1 0 0 0 6 4-4edge.dat
  [1,16,0,0,0,6,0,0,0,1,0,0,0,6, ldraw_lib__4_4edge()],
// 1 16 0 0 0 2 0 0 0 1 0 0 0 2 4-4ring4.dat
  [1,16,0,0,0,2,0,0,0,1,0,0,0,2, ldraw_lib__4_4ring4()],
// 1 16 0 0 0 2 0 0 0 1 0 0 0 2 4-4ring3.dat
  [1,16,0,0,0,2,0,0,0,1,0,0,0,2, ldraw_lib__4_4ring3()],
// 0 BFC INVERTNEXT
  [0,"BFC","INVERTNEXT"],
// 1 16 0 0 0 4 0 0 0 3 0 0 0 4 4-4cyli.dat
  [1,16,0,0,0,4,0,0,0,3,0,0,0,4, ldraw_lib__4_4cyli()],
// 1 16 0 0 0 1 0 0 0 1 0 0 0 1 stud2a.dat
  [1,16,0,0,0,1,0,0,0,1,0,0,0,1, ldraw_lib__stud2a()],
];
makepoly(ldraw_lib__85861(), line=0.2);
